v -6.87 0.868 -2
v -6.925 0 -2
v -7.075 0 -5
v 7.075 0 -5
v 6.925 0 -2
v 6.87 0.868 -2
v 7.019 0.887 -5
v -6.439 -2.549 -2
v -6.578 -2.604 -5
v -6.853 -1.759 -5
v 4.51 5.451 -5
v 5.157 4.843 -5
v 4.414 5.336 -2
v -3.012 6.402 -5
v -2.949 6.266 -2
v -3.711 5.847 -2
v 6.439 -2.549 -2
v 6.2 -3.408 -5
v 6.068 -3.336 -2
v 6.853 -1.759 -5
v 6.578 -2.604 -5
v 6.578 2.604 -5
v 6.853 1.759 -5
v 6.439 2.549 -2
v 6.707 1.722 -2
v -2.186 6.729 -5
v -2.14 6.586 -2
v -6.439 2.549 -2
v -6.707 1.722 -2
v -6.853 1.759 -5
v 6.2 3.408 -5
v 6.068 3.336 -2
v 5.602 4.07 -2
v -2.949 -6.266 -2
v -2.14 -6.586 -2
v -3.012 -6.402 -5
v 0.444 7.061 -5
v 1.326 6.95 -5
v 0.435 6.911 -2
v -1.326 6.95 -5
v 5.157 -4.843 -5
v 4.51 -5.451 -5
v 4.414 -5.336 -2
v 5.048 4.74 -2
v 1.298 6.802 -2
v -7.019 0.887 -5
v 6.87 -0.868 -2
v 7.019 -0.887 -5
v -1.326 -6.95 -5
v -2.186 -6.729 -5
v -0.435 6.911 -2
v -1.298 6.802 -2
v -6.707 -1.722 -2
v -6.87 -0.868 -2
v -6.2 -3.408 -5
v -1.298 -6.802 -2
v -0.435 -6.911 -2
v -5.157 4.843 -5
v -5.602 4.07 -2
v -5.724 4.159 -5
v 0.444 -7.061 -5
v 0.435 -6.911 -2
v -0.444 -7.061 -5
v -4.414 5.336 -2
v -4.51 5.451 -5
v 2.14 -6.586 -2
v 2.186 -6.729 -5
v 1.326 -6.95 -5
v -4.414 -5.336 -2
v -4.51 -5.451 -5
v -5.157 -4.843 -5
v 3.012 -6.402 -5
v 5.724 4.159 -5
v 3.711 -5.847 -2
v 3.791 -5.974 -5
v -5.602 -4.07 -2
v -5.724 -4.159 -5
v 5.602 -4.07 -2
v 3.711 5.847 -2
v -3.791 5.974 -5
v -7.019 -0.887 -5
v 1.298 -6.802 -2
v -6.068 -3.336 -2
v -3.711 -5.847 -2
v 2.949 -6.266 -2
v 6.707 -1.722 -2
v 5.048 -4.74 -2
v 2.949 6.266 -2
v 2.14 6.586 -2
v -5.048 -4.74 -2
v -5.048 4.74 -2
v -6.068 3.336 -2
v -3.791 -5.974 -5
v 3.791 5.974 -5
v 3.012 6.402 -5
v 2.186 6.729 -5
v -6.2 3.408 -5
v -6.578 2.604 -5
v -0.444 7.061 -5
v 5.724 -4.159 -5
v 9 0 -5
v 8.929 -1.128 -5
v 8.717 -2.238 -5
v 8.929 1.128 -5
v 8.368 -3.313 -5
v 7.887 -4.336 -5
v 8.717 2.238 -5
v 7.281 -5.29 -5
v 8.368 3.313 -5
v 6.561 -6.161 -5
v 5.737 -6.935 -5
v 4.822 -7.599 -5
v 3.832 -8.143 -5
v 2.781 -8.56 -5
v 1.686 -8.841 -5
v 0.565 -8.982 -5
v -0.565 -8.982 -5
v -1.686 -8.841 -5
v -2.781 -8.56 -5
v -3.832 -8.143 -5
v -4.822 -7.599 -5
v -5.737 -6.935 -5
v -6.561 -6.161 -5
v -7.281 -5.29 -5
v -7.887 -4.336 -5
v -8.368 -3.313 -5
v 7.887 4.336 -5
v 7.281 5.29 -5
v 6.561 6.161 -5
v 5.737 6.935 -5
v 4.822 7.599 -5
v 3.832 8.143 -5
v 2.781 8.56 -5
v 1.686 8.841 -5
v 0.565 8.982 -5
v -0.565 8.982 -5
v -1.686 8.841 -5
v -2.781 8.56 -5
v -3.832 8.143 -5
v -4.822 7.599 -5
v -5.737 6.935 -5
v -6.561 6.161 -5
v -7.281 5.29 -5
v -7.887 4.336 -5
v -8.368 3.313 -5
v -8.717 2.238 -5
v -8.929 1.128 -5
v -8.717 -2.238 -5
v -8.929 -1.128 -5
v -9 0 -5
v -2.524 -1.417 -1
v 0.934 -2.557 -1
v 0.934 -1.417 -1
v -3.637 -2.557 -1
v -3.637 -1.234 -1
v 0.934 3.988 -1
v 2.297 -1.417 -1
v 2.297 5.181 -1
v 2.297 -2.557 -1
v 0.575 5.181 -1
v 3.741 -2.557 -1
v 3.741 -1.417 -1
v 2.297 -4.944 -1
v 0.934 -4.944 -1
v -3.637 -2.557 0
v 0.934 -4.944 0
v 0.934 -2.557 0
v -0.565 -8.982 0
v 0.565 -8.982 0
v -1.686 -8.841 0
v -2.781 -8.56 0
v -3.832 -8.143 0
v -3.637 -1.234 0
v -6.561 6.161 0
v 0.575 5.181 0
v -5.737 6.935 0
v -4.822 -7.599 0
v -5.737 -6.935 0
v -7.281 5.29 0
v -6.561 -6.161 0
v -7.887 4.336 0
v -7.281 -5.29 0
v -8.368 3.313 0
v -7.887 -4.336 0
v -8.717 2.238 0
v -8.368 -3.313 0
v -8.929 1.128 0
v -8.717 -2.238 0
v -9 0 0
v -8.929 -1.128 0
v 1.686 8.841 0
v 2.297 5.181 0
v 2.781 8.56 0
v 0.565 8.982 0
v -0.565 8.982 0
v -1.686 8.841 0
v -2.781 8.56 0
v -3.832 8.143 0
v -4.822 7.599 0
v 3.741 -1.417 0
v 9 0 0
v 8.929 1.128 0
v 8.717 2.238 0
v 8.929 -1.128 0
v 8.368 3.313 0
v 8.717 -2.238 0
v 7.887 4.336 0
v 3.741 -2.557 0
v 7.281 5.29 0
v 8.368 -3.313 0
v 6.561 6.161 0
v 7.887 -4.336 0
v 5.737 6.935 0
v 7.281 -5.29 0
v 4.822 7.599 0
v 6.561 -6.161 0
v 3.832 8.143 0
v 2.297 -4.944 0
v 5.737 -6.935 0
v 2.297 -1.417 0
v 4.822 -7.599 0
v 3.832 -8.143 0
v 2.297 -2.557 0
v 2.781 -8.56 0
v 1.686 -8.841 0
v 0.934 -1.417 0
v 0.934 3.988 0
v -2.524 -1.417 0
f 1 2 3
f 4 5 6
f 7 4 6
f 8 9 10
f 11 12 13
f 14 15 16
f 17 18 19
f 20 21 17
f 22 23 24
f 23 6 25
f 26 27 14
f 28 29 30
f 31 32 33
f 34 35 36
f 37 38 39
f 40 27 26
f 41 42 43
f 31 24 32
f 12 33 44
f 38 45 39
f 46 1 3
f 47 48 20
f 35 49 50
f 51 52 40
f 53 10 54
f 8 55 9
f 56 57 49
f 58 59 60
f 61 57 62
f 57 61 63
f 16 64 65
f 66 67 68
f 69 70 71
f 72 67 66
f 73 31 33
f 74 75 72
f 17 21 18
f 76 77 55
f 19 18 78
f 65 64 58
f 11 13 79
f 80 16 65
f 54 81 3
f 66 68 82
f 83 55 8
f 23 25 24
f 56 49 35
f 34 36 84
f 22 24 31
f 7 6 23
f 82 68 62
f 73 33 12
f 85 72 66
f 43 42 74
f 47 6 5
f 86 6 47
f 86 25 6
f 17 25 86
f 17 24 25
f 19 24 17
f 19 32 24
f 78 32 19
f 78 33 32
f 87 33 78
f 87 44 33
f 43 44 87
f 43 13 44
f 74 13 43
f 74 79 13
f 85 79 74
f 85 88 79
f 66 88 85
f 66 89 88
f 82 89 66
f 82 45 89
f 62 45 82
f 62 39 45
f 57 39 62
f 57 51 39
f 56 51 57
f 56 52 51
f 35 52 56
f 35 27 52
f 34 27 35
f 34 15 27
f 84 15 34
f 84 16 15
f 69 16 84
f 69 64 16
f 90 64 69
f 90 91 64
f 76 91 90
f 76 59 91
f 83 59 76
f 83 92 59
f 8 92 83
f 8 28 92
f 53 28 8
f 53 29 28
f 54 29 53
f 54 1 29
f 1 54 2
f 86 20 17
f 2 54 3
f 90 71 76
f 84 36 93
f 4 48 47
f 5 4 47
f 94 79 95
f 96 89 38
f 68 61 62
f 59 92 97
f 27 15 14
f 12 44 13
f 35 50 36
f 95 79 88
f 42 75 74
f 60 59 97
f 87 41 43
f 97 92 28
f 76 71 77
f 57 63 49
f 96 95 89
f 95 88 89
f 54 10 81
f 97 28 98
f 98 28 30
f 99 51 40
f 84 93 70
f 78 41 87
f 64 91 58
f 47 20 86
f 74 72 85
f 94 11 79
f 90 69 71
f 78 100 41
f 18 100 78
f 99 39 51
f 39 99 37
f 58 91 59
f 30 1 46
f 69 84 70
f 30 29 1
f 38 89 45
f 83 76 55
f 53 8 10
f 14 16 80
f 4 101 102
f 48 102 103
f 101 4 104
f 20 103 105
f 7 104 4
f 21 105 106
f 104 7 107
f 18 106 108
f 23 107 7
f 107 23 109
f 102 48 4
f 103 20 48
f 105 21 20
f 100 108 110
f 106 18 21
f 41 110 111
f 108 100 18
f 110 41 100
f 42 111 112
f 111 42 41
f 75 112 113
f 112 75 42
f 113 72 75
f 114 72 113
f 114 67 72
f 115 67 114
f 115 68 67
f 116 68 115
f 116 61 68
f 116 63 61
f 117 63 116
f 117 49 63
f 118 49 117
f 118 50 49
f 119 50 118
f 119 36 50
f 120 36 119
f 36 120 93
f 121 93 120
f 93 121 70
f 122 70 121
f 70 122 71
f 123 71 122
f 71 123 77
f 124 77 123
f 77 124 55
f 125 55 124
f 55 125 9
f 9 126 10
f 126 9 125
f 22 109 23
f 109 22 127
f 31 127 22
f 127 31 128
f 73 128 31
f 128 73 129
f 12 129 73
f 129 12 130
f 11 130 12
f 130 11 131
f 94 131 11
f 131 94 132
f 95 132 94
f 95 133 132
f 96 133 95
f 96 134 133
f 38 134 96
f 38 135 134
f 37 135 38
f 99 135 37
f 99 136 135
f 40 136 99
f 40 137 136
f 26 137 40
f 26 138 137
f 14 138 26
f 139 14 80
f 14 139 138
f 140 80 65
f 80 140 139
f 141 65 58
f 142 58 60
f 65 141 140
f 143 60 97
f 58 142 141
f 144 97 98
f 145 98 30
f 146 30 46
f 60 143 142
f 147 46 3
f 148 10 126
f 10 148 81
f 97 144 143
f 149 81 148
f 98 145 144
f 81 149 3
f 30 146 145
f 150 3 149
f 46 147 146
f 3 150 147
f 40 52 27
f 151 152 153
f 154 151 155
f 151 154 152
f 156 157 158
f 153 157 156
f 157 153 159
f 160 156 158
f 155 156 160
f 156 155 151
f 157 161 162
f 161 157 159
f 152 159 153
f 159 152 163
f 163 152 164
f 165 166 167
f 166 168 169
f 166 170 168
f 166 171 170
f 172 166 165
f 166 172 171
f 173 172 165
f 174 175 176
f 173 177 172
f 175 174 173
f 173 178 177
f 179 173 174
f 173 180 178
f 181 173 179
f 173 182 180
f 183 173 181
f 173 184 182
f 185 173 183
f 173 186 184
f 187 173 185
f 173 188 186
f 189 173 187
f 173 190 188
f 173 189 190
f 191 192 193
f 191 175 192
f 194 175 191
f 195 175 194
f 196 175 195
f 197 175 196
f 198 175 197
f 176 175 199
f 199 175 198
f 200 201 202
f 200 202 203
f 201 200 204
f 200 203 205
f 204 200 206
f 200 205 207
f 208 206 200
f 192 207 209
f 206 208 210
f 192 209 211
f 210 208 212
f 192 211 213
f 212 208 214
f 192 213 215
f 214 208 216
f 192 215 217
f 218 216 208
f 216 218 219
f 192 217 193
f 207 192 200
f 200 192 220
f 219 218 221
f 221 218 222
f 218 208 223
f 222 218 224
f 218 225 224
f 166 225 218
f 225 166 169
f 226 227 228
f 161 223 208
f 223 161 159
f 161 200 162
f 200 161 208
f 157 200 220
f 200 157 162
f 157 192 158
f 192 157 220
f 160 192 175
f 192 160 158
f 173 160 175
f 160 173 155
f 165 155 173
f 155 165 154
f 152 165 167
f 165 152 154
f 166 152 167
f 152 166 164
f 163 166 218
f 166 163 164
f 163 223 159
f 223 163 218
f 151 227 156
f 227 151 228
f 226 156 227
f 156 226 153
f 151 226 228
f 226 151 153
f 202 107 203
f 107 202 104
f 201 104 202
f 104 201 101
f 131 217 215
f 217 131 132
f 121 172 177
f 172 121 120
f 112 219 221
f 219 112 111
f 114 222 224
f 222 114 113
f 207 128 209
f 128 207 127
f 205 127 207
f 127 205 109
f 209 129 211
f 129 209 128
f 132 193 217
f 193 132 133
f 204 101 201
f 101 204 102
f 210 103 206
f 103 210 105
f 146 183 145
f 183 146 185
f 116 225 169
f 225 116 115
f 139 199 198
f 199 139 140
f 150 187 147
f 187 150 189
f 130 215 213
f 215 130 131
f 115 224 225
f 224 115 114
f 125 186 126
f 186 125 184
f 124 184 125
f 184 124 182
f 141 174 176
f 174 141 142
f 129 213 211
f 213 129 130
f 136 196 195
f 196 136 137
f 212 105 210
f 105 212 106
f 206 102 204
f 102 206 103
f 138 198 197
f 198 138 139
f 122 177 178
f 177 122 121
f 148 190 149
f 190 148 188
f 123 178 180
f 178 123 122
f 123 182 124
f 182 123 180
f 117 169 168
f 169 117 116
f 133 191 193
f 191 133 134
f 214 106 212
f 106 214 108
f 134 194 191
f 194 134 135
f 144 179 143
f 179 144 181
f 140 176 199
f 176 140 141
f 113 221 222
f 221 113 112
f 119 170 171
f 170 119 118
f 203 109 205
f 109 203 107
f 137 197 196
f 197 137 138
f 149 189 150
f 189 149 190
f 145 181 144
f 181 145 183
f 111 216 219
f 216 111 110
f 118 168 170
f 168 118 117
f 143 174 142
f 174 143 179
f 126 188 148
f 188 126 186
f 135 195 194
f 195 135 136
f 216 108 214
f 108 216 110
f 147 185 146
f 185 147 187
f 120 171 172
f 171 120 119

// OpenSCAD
$fn = 50;


difference() {
	union() {
		translate(v = [0, 0, -5.0000000000]) {
			cylinder(h = 5, r = 9.0000000000);
		}
	}
	union() {
		#translate(v = [0, 0, -5.0000000000]) {
			cylinder(h = 3, r1 = 7.0750000000, r2 = 6.9250000000);
		}
		translate(v = [0, 0, -1]) {
			linear_extrude(height = 1) {
				text(font = "Impact", halign = "center", size = 10, text = "4", valign = "center");
			}
		}
	}
}
